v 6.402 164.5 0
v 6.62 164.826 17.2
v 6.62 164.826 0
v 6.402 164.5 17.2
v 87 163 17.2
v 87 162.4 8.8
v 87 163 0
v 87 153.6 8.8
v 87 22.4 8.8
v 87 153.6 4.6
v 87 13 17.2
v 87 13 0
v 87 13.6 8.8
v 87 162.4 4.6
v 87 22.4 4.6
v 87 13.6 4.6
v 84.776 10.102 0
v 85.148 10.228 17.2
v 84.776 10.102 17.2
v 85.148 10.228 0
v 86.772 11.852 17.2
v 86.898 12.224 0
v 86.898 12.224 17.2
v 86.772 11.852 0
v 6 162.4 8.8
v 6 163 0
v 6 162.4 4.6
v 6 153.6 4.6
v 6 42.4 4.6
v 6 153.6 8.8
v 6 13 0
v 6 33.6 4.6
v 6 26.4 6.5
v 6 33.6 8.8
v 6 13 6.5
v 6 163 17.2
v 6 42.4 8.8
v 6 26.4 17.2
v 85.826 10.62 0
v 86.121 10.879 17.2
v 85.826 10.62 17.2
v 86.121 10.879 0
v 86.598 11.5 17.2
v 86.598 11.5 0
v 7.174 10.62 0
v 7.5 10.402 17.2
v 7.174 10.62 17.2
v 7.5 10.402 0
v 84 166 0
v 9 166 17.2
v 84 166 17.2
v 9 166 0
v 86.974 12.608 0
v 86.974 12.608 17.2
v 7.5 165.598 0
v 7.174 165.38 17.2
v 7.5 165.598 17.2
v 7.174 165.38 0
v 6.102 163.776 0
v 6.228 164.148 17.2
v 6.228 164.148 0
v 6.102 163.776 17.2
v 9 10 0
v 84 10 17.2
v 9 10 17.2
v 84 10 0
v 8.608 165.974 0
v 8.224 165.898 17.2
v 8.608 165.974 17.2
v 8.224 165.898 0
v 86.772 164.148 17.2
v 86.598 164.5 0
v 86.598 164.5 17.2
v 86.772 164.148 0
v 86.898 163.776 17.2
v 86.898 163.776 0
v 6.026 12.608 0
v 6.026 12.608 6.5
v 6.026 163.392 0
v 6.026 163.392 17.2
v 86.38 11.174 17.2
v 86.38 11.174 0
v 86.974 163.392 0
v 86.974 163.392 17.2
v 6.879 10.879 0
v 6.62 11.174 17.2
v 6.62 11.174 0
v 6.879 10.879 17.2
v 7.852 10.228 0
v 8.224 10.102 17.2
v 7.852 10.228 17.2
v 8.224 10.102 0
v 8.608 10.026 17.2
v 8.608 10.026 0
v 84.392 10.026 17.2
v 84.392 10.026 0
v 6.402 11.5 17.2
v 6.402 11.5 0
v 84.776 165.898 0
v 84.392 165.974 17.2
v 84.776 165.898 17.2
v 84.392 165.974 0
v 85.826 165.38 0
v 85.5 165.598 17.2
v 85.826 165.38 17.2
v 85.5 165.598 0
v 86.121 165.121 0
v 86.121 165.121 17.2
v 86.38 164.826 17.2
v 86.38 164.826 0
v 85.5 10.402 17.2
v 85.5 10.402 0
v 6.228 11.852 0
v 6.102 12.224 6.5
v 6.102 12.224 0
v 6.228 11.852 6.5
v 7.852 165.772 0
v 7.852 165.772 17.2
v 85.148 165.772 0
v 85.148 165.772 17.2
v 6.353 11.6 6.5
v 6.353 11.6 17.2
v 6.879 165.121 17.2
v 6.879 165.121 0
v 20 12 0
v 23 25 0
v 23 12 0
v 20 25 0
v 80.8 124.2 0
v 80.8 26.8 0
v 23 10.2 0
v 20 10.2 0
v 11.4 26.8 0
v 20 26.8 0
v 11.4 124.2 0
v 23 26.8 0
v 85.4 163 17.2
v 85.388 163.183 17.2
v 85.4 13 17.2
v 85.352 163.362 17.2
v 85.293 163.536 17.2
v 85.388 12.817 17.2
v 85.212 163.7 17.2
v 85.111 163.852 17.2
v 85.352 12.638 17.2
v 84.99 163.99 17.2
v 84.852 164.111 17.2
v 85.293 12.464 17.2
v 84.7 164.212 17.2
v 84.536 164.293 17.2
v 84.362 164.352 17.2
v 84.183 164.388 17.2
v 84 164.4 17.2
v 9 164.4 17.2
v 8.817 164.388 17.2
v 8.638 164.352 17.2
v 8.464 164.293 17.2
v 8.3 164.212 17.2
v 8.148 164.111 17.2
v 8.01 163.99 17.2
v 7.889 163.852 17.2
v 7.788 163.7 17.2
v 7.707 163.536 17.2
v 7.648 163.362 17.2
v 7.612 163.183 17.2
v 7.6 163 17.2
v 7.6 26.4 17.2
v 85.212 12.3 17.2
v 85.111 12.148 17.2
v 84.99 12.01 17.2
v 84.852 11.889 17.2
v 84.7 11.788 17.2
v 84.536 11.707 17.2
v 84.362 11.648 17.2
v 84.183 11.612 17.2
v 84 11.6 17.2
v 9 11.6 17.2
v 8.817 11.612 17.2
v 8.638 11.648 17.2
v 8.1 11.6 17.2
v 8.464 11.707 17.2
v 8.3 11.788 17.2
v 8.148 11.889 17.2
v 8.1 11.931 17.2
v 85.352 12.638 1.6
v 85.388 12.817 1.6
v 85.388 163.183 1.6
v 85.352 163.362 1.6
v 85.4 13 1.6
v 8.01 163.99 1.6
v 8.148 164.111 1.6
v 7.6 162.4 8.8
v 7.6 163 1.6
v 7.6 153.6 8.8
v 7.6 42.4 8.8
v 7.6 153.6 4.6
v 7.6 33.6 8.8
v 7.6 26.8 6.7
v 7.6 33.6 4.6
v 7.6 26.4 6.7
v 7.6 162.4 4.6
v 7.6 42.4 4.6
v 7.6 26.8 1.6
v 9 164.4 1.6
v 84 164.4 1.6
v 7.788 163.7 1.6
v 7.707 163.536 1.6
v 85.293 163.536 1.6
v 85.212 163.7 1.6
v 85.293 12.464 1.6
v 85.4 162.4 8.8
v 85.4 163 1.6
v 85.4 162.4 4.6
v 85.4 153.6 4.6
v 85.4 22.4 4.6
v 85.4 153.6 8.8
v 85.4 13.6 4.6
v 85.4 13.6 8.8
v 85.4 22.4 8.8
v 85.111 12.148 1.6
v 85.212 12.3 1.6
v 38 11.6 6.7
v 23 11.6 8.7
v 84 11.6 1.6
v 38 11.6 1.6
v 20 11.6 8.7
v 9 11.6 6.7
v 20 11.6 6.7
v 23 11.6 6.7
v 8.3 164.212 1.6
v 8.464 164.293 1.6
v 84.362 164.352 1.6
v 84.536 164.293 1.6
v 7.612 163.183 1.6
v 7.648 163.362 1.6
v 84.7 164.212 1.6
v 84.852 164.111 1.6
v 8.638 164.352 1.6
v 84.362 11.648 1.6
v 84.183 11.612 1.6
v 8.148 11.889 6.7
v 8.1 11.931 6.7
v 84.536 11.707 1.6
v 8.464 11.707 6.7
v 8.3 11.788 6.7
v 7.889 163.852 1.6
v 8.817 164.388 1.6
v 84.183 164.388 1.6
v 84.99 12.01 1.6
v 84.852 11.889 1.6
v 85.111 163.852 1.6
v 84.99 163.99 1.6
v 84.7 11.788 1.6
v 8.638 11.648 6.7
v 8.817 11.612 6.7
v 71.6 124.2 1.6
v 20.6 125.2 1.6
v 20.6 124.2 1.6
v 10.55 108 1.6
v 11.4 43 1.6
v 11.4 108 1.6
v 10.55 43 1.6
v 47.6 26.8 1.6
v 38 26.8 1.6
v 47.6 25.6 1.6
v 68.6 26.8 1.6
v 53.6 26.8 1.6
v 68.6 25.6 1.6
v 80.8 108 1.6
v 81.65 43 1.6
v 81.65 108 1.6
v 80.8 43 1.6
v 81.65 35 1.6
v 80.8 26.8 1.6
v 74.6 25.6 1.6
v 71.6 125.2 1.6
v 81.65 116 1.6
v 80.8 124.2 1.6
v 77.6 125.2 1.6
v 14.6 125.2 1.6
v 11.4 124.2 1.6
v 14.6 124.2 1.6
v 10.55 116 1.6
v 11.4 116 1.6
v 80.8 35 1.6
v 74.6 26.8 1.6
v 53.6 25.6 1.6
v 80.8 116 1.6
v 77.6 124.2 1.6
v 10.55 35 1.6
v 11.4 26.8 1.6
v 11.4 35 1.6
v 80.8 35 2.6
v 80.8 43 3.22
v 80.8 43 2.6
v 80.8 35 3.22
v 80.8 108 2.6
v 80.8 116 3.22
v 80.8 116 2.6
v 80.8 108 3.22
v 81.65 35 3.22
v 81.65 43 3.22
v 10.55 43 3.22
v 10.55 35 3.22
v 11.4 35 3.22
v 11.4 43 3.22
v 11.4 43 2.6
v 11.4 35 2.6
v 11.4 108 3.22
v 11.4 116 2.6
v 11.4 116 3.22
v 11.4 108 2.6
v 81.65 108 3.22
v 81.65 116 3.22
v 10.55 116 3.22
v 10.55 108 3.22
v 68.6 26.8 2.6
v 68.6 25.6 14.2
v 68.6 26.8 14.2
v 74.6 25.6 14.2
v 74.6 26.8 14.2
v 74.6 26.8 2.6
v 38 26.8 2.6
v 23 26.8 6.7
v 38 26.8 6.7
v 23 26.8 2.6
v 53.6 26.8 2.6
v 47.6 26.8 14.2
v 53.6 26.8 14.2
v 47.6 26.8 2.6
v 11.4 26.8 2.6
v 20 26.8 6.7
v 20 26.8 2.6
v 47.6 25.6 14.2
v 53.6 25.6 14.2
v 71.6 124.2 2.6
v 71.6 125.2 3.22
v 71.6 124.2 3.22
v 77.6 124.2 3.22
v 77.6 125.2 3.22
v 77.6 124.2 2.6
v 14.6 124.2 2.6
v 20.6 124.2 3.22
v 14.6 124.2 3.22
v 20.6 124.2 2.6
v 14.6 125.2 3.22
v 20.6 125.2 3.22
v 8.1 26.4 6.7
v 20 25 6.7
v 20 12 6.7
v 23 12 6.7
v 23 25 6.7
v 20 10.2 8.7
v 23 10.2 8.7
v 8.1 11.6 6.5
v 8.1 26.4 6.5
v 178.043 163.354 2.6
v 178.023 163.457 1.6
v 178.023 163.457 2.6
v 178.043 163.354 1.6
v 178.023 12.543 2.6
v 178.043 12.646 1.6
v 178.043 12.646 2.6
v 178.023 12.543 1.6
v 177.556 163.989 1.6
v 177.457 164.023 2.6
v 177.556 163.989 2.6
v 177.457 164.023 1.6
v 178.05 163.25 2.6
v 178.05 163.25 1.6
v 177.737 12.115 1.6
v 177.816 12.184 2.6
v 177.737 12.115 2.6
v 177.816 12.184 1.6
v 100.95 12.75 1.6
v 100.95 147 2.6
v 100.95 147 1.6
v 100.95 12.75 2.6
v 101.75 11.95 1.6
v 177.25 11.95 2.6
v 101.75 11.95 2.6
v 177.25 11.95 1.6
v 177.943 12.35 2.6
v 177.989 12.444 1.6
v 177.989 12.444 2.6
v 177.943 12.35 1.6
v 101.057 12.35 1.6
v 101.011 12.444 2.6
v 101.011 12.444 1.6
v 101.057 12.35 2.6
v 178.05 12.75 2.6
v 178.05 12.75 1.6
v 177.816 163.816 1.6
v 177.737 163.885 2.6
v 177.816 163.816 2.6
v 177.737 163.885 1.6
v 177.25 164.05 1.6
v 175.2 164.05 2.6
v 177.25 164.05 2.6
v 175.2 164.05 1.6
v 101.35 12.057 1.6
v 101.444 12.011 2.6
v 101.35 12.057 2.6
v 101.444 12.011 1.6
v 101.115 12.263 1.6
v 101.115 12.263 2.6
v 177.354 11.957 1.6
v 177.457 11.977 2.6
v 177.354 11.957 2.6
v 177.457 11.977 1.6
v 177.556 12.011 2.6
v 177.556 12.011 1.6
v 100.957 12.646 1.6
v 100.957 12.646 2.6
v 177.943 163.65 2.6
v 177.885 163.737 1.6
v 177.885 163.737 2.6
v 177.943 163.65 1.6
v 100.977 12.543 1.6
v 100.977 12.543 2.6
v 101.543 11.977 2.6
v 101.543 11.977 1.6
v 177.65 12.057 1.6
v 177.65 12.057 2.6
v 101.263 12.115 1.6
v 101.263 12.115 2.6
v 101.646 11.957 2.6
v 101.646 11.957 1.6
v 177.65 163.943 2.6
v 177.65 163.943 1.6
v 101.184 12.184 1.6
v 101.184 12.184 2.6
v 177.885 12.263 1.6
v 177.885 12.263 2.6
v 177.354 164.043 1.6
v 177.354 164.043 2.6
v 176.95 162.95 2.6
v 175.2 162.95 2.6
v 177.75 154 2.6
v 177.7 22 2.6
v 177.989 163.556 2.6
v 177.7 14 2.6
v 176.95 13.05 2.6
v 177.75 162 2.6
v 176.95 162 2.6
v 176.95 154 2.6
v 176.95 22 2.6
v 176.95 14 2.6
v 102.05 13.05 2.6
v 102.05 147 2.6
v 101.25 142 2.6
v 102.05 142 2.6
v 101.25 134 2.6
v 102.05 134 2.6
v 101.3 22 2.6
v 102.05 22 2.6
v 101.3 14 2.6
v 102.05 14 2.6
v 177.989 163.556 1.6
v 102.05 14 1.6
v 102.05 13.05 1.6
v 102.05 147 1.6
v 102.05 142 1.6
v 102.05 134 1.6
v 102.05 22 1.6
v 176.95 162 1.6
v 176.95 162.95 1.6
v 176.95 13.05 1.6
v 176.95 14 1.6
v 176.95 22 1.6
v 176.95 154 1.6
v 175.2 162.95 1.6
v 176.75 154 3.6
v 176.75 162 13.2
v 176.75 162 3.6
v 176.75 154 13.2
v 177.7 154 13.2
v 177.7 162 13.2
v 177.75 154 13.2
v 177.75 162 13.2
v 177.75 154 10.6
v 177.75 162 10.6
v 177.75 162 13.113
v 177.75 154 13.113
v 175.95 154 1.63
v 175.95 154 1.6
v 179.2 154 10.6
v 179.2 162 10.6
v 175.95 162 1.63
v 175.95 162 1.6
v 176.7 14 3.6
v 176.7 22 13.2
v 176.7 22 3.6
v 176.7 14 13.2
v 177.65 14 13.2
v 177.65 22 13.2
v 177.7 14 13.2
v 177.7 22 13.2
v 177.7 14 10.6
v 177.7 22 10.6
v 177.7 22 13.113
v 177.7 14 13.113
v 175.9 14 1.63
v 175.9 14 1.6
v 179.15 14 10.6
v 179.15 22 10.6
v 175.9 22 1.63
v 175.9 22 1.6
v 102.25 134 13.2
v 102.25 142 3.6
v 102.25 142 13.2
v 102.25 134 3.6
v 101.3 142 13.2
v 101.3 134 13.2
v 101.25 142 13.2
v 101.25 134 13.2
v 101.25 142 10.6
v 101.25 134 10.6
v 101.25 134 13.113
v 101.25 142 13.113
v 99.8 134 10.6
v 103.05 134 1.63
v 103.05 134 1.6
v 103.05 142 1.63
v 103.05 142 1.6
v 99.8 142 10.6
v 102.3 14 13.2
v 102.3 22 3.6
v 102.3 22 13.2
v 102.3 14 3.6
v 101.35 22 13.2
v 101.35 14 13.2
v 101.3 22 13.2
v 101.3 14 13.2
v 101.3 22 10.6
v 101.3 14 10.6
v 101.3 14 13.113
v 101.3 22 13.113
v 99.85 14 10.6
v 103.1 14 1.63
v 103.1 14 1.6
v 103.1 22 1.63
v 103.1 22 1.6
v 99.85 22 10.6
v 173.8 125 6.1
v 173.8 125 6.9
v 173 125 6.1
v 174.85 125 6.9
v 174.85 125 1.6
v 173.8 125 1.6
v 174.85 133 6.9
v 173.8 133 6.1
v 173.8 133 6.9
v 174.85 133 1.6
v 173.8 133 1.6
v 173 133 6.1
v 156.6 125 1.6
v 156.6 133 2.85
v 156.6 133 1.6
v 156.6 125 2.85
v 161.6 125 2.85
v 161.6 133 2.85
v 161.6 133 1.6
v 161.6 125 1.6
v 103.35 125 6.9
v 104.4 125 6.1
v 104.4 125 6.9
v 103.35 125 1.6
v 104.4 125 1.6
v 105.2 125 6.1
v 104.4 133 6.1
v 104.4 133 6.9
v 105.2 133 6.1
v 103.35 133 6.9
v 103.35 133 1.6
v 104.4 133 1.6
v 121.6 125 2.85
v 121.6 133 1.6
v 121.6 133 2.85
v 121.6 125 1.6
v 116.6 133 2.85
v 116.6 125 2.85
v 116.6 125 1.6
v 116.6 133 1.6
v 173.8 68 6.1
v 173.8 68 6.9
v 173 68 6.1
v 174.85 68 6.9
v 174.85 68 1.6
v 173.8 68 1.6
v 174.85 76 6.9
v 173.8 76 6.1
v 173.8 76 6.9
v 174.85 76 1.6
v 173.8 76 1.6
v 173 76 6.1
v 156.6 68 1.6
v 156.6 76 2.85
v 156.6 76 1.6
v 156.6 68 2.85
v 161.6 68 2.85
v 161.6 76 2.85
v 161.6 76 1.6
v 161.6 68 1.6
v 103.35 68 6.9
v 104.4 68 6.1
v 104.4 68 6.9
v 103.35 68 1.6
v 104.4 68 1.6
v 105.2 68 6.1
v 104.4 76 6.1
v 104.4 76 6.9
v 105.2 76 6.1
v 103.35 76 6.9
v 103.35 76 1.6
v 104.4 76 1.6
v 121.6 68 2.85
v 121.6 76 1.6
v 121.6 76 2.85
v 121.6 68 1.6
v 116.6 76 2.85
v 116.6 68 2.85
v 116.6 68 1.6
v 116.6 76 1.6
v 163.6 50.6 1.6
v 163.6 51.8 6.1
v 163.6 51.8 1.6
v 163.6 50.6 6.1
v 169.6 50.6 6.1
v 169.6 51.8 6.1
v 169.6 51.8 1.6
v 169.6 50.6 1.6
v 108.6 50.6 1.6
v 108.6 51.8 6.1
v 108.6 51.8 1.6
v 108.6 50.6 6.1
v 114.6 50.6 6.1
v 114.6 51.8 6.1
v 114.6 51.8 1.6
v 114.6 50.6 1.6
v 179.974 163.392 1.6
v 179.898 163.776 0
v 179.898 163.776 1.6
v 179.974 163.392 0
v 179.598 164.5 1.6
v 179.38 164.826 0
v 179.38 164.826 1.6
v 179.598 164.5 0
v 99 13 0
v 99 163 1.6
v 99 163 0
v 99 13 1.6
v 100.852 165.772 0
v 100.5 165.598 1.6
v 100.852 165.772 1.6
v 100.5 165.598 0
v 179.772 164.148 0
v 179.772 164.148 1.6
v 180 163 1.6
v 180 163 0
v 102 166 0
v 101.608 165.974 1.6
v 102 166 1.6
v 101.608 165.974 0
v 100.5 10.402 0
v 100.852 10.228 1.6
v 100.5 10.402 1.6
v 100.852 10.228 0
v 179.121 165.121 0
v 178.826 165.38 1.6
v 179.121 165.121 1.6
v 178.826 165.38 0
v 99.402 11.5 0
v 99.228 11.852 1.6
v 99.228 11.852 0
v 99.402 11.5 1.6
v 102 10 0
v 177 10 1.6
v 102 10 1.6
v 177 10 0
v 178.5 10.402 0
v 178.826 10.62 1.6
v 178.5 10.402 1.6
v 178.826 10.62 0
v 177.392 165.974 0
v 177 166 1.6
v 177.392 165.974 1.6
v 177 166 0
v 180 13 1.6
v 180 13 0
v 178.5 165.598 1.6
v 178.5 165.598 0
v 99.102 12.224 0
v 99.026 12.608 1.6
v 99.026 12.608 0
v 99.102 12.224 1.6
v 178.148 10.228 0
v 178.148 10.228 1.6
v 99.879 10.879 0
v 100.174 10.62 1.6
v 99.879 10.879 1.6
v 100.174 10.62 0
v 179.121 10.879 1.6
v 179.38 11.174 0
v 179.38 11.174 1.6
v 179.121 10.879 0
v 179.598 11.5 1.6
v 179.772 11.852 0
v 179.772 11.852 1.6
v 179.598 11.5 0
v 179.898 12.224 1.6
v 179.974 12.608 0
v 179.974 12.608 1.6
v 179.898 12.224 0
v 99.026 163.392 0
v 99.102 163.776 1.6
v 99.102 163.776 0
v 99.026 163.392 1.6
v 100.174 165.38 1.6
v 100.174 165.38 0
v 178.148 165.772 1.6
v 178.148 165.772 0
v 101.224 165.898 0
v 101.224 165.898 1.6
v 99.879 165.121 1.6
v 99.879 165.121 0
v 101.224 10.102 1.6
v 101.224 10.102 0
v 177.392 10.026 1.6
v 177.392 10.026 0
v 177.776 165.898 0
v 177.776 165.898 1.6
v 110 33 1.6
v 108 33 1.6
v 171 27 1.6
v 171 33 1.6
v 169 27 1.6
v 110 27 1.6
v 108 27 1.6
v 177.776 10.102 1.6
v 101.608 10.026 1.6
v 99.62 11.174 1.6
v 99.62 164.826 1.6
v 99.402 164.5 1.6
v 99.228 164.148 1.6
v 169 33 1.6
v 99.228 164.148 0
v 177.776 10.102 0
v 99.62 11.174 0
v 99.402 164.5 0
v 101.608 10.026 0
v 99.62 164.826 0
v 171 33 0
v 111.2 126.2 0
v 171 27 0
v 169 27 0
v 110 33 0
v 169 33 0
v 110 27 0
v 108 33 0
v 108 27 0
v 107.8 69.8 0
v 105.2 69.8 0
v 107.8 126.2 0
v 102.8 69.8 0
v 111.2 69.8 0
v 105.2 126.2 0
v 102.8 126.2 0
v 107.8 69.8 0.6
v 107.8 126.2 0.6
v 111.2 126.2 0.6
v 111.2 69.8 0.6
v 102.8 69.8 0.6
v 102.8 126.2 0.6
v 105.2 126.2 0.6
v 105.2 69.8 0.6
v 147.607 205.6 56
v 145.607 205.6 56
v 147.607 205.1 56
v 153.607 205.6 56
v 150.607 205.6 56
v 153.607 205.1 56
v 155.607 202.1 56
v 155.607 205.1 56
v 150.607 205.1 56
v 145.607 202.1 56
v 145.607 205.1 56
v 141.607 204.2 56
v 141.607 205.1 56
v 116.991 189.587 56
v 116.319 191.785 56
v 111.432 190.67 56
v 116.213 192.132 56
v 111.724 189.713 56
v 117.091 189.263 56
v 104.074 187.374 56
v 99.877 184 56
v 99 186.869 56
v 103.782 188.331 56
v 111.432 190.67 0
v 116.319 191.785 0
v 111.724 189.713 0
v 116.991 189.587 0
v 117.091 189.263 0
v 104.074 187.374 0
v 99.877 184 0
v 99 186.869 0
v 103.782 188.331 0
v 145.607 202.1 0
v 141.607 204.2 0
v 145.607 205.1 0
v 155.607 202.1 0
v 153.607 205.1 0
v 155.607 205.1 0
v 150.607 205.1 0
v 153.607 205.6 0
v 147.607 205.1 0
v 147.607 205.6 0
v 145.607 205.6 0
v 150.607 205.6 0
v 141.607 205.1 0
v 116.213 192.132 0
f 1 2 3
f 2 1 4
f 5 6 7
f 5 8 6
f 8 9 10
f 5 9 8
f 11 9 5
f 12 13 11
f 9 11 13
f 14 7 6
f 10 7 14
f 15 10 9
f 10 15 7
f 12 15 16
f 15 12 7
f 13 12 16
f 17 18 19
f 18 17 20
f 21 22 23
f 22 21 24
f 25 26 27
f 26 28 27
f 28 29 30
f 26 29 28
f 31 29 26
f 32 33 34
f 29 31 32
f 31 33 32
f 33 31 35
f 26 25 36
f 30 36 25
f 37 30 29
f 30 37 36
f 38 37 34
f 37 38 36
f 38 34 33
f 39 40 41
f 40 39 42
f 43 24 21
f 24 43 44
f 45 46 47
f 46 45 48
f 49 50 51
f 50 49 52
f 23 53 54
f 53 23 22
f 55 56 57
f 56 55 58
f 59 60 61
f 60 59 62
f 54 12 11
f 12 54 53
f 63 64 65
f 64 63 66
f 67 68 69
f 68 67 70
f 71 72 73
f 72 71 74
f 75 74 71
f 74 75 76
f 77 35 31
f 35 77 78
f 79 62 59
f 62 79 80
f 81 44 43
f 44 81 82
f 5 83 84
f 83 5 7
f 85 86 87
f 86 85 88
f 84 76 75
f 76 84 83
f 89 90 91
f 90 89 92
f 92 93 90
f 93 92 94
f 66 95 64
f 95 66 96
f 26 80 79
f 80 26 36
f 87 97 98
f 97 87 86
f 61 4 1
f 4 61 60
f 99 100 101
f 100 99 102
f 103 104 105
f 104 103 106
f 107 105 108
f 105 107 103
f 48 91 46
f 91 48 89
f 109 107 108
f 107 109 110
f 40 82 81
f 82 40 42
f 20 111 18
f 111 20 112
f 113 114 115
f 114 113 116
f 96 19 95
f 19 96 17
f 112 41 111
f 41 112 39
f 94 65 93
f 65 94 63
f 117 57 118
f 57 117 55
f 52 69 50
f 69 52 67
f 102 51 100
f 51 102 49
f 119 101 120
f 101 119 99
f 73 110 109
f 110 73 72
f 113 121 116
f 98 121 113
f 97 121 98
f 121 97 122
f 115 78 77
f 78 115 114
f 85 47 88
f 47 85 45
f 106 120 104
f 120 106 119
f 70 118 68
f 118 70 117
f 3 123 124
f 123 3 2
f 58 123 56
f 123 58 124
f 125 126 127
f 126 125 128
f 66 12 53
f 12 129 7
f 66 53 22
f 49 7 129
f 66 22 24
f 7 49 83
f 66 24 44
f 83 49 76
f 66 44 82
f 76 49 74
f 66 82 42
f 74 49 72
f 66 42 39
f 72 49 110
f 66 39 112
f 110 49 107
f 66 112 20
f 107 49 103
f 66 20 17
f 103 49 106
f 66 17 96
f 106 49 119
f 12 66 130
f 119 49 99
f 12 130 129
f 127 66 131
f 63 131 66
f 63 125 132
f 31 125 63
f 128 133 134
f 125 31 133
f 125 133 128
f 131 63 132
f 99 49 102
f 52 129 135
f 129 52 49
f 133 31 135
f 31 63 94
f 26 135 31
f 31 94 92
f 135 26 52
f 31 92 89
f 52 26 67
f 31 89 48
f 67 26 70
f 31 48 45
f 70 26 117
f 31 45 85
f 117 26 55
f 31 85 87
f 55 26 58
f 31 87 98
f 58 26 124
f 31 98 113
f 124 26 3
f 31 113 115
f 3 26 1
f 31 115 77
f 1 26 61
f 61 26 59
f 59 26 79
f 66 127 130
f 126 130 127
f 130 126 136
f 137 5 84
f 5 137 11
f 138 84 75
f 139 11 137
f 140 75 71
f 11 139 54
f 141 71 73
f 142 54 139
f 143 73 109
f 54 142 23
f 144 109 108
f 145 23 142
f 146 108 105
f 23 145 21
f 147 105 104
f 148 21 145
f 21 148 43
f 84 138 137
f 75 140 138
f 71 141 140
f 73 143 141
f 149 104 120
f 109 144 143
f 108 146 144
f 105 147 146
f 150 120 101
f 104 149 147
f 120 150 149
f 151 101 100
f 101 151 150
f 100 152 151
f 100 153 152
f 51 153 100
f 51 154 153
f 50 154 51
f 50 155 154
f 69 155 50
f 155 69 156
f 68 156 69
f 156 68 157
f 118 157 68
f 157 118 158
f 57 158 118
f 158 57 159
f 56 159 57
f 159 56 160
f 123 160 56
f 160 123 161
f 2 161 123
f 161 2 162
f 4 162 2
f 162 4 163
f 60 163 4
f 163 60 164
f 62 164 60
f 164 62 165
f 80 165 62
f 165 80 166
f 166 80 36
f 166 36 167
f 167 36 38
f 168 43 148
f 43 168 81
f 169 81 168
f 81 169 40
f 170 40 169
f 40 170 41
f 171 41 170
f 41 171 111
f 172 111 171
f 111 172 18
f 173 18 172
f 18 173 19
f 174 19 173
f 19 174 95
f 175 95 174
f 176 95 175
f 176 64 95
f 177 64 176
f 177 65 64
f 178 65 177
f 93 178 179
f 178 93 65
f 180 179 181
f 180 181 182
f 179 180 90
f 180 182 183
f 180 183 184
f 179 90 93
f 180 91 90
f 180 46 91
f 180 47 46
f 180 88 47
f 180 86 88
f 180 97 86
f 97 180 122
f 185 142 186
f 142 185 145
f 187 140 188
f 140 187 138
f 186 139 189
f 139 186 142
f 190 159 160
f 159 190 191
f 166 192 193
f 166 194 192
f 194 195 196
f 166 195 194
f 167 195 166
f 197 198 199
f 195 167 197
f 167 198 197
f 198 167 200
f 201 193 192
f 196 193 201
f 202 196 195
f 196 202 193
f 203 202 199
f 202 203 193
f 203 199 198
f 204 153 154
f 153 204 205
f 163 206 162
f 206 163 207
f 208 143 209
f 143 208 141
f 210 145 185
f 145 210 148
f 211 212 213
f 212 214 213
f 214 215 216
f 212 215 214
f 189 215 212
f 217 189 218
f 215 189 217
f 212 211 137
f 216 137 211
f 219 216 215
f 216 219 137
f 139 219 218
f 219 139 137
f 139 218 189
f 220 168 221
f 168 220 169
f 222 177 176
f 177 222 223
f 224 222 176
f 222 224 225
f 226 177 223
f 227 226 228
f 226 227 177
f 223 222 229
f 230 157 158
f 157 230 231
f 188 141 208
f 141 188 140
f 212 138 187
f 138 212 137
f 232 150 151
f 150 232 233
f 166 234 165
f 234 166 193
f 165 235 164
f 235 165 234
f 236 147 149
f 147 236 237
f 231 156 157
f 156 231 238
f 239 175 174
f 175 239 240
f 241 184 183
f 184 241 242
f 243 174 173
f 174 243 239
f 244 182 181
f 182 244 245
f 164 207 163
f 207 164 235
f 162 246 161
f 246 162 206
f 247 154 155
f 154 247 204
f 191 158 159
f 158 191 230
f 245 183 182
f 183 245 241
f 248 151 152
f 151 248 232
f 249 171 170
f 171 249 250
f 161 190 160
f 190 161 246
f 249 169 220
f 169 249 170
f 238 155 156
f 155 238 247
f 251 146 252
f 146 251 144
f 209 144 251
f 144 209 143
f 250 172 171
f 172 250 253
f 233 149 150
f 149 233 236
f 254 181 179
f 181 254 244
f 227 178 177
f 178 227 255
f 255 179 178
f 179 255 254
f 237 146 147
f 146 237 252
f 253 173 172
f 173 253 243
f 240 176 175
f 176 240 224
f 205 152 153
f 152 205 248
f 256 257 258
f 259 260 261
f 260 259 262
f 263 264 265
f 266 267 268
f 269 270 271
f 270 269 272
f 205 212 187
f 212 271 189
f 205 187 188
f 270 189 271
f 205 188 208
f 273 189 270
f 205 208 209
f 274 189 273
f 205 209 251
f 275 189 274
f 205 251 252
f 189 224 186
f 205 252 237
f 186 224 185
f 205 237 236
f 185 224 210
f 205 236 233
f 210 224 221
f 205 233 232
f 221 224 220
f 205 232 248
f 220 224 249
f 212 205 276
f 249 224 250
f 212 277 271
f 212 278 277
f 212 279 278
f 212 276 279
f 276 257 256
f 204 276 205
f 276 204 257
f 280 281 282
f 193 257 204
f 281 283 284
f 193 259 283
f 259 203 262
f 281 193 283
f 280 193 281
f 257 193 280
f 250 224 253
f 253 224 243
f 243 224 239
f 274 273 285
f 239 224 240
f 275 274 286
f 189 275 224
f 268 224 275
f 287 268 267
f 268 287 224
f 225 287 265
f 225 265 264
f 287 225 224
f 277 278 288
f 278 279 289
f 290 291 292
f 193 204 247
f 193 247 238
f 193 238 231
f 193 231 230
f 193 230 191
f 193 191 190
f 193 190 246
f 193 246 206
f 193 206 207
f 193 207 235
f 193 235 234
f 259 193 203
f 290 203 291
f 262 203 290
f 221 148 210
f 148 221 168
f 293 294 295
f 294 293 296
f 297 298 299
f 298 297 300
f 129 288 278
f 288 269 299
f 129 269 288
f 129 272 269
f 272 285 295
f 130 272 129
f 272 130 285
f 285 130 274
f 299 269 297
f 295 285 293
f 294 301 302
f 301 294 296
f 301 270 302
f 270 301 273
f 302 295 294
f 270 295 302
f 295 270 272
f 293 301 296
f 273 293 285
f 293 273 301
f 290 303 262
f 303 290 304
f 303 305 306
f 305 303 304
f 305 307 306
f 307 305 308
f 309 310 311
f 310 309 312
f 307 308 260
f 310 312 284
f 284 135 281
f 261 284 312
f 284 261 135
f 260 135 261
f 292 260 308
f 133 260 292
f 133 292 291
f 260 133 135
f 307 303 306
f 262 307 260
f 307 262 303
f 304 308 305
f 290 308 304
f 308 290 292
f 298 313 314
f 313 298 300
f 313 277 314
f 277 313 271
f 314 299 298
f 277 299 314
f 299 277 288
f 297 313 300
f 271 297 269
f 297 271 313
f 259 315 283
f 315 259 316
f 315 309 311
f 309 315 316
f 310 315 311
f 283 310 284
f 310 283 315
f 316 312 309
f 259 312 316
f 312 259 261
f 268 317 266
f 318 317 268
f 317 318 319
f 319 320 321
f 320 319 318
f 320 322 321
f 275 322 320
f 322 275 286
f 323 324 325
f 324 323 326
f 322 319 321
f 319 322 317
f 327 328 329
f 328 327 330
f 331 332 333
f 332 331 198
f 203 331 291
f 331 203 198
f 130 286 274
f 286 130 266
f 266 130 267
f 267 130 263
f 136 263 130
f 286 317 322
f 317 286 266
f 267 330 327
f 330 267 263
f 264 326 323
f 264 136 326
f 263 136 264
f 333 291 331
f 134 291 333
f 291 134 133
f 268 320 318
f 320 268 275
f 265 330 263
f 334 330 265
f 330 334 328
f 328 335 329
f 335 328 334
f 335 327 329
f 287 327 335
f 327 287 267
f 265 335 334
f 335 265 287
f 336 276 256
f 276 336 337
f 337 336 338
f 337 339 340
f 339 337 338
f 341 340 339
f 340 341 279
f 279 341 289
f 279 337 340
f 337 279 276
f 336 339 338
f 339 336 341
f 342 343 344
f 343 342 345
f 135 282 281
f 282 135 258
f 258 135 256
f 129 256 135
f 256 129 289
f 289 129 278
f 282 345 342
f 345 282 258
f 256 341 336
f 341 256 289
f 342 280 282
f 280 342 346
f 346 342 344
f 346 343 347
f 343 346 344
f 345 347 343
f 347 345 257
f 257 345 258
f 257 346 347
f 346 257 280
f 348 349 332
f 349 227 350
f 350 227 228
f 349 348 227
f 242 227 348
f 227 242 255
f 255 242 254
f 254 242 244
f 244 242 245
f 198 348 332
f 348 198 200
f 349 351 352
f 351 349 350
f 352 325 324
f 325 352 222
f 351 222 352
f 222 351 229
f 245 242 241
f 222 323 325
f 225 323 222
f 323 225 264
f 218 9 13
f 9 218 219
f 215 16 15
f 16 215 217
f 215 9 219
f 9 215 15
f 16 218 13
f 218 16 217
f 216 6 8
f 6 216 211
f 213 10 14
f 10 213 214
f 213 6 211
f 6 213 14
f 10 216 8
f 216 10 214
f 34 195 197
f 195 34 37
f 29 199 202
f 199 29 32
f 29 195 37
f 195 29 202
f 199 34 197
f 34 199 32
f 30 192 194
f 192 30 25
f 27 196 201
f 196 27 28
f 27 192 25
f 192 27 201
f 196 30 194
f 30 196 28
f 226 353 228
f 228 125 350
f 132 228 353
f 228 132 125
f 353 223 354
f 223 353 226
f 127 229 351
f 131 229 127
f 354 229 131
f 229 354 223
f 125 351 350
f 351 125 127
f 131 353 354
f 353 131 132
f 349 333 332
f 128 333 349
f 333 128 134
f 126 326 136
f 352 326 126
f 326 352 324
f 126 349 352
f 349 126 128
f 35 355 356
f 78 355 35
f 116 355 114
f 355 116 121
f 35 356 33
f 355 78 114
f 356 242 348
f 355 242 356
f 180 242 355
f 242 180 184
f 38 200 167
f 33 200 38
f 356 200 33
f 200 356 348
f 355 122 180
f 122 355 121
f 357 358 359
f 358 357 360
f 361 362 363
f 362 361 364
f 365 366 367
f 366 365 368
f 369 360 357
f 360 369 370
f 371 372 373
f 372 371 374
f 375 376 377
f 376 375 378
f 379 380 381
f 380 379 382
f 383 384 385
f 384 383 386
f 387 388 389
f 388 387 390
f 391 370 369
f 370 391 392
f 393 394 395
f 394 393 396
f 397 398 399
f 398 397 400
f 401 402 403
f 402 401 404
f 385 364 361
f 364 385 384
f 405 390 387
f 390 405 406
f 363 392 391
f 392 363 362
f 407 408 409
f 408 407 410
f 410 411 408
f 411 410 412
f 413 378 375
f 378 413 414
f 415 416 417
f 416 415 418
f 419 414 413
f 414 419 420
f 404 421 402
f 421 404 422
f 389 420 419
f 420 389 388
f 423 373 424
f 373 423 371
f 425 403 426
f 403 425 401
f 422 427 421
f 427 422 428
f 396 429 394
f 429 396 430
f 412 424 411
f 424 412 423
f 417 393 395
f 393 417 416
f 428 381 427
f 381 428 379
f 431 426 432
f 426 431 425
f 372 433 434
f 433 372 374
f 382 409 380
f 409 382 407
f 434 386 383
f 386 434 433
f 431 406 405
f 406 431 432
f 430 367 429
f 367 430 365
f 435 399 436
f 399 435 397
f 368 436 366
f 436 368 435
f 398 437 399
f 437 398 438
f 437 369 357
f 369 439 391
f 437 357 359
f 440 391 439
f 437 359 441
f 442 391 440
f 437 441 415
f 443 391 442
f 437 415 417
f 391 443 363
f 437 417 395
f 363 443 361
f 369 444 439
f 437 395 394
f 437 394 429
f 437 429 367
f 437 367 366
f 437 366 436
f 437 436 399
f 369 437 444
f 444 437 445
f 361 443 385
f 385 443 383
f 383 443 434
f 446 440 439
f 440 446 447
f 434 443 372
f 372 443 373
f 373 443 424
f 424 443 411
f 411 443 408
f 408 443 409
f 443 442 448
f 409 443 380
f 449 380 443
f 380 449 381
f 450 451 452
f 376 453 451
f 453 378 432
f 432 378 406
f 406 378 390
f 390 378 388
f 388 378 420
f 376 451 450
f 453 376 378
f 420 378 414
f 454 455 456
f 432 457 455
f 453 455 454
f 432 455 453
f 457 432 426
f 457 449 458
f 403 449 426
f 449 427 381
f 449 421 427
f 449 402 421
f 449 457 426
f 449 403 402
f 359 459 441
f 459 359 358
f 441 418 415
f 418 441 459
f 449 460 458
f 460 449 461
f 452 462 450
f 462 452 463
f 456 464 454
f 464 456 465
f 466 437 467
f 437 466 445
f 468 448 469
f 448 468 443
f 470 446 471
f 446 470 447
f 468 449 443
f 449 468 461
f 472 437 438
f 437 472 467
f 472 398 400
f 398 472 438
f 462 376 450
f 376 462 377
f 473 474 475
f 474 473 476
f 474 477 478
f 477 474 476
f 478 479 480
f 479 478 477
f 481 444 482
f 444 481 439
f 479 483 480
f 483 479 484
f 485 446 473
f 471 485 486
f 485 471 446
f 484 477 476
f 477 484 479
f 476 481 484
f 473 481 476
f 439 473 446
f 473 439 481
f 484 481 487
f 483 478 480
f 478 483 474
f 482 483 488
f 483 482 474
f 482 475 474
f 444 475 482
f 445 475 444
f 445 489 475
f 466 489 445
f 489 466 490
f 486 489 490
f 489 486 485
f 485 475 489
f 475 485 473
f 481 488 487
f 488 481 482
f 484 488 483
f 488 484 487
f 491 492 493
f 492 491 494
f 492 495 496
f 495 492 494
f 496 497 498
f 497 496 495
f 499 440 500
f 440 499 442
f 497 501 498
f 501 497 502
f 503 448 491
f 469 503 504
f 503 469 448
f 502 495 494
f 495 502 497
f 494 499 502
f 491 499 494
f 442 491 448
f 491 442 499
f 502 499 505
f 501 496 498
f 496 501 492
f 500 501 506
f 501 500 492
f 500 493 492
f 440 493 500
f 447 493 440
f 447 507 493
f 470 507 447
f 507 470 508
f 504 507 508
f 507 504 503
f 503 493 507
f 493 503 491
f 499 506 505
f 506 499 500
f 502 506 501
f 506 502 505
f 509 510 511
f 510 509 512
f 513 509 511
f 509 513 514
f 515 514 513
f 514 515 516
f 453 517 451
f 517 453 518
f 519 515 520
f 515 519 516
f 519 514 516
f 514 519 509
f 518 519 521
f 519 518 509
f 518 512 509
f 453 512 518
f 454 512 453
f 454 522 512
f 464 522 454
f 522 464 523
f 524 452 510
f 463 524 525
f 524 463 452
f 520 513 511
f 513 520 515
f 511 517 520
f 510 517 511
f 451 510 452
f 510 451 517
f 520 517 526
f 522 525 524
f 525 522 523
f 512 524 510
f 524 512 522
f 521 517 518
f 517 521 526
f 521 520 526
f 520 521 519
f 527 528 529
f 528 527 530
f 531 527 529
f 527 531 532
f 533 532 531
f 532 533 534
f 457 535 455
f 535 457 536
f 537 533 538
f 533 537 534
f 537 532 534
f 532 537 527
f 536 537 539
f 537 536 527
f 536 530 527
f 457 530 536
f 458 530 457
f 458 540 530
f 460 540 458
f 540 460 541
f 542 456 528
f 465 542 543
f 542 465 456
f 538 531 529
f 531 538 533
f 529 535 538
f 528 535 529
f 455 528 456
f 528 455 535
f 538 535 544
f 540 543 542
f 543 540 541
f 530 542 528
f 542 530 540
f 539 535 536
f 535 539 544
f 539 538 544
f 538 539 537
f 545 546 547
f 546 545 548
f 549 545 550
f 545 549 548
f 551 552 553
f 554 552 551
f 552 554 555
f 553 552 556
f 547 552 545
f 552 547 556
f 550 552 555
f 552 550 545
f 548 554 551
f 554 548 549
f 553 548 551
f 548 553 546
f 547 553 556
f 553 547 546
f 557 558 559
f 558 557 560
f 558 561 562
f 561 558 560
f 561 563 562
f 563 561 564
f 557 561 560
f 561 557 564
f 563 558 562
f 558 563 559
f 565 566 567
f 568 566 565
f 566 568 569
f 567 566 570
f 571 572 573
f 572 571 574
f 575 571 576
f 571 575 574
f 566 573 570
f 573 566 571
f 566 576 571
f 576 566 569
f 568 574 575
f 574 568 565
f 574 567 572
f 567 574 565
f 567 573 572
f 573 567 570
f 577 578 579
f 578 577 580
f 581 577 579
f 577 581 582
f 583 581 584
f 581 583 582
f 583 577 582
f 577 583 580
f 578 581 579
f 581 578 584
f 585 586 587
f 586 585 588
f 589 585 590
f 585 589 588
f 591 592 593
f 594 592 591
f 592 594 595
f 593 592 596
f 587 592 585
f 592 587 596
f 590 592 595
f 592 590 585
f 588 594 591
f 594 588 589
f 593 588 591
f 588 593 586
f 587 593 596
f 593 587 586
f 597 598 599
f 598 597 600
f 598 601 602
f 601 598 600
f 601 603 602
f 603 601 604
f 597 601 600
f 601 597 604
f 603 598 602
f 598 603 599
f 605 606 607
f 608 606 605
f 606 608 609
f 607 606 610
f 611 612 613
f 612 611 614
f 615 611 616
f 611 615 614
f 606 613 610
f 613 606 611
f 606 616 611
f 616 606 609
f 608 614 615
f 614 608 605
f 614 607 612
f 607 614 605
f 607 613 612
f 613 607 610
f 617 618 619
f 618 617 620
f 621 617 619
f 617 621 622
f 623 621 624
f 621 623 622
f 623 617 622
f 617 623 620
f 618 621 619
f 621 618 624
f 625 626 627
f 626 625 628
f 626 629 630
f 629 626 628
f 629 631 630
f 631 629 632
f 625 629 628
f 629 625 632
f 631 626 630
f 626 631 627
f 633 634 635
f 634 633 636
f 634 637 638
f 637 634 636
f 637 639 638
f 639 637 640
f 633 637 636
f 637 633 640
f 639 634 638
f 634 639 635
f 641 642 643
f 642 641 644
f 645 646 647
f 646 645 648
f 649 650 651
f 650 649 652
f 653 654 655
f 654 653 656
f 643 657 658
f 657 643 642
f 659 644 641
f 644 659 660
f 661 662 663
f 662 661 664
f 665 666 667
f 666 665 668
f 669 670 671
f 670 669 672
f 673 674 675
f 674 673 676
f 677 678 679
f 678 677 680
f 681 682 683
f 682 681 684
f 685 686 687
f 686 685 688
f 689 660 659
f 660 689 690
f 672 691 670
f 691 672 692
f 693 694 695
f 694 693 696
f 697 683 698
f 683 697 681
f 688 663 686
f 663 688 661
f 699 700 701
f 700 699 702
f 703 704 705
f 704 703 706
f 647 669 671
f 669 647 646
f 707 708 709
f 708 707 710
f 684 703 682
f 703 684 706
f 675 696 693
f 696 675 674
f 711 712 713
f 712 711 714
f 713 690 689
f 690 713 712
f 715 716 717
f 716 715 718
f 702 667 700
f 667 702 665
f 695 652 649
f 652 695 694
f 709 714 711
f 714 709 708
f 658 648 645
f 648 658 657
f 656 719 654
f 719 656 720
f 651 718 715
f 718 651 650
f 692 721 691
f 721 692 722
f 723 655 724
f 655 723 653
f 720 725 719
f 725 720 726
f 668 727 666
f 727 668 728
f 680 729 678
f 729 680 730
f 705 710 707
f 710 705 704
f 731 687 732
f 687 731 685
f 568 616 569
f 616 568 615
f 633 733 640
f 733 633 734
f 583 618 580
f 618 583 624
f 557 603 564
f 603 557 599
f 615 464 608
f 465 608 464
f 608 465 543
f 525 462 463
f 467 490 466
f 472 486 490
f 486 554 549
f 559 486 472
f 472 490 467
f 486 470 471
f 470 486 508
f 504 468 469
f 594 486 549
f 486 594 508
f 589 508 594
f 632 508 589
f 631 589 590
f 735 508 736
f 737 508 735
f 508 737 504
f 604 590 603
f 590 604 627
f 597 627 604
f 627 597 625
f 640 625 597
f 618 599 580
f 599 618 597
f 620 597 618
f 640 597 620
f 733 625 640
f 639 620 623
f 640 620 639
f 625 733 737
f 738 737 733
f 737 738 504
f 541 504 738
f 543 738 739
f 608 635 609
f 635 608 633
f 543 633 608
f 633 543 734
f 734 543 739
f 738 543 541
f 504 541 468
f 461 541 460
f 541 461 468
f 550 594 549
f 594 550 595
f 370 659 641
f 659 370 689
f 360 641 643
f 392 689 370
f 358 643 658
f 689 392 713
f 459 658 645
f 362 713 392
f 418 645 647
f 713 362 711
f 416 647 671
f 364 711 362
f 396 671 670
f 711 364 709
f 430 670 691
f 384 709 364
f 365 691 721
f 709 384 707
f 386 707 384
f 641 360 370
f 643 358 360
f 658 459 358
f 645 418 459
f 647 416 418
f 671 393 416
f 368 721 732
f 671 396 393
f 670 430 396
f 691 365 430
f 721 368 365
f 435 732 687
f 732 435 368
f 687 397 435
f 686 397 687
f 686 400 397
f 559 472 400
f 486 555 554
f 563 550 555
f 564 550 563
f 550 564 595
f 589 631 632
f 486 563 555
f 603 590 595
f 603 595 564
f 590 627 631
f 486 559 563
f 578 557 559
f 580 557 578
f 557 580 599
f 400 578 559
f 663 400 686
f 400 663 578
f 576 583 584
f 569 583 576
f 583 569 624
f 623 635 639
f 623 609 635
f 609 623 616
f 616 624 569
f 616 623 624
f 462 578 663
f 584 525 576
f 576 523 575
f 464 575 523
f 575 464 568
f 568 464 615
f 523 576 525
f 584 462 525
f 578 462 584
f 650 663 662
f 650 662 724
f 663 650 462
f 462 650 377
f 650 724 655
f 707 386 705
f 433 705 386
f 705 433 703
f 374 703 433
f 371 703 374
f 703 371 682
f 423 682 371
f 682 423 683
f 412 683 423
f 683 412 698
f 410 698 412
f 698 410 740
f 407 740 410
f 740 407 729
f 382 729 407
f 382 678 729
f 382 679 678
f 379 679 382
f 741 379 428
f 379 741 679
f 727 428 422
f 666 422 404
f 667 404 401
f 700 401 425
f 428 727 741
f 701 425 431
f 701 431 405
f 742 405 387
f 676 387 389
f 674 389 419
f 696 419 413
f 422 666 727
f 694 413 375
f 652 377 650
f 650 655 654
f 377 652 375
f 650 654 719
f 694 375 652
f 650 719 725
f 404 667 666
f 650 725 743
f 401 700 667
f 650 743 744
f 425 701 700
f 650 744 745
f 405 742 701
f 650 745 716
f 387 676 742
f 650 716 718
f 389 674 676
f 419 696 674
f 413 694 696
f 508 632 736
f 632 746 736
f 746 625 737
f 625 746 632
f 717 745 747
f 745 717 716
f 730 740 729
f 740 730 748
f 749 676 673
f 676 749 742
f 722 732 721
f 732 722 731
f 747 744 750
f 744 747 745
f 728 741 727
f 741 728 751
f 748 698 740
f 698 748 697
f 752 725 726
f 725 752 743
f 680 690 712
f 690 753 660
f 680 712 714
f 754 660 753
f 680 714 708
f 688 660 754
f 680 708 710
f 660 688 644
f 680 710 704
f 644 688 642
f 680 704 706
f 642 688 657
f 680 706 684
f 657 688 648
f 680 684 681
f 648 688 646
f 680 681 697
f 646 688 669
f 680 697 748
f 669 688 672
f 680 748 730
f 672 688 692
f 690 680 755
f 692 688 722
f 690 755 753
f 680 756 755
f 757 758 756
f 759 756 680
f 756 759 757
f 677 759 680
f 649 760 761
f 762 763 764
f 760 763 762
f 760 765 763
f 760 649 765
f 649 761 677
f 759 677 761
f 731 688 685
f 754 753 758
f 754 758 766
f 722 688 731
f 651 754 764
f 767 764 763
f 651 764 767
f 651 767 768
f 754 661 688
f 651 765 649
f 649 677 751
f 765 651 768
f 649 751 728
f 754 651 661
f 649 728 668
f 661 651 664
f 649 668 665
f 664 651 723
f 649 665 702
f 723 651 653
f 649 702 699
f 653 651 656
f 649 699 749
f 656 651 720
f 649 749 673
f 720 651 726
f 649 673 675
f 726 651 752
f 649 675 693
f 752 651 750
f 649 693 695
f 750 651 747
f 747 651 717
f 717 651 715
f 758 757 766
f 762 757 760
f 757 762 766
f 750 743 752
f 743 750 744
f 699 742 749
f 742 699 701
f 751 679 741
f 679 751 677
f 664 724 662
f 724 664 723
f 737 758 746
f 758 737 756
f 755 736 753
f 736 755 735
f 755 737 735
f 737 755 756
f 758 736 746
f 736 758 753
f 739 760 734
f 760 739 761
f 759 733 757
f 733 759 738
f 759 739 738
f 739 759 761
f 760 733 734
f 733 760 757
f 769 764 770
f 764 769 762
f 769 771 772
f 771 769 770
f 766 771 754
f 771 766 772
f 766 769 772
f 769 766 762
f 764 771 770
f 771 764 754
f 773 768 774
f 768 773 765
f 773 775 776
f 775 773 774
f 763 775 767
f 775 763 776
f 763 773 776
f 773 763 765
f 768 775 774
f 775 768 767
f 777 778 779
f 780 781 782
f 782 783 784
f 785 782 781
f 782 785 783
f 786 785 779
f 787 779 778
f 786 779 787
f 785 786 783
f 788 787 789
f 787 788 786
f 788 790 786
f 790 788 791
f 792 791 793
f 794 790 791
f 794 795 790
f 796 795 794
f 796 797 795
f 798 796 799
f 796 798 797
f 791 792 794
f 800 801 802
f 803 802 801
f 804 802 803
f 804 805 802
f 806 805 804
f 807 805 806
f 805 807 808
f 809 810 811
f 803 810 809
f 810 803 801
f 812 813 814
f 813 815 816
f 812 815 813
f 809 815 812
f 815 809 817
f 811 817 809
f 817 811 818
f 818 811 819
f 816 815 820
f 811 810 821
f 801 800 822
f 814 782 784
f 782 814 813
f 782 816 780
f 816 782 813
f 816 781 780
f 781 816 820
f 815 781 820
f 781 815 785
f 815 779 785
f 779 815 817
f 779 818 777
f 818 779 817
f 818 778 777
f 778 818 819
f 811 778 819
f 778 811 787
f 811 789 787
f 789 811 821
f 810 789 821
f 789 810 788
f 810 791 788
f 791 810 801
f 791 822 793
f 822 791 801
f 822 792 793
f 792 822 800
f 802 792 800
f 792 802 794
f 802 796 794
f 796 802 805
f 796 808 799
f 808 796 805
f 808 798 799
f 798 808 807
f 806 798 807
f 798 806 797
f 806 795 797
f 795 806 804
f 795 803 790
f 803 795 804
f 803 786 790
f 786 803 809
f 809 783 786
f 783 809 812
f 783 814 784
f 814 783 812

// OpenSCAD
// Revision 5: acrylic slide retention; no buttons; 3 parts. Millimeters.
part="layout";
$fn=48; eps=.03;
W=81; H=156; D=17.2; lid_t=1.6; wall=1.6;
DX=6.4; DY=17; DW=69; DH=97;
glass_z=1.9; device_t=14; acrylic_t=3;
acrylic_z=glass_z+device_t; acrylic_front=acrylic_z-acrylic_t;
seat_z=acrylic_z+.05; rail_shoulder=acrylic_front-.2;
// The acrylic slide grooves provide the forward stop; the window does NOT
// overlap or clamp glass. 0.2 mm reveal per side exposes the entire glass.
window_overlap=-.2; lateral_clearance=.2;
// Same latch projection reference as revision 4: +0.4 mm toward the outside.
// Stem reach from lid inner face: 12.3 - 0.7 = 11.6 mm.
hook_tip=D-11.6; hook_shoulder=hook_tip+2.6;
clips=[[0,8],[0,148],[1,28],[1,148]];
screen_setback=10; mount_angle=17;
mount_x=W+34; mount_z=44.8+(glass_z-2.2)-screen_setback;
bracket_span=mount_x+9*cos(mount_angle);
bracket_top_z=mount_z+9*sin(mount_angle)+3*cos(mount_angle);
usb_center_z=glass_z+20-screen_setback; usb_floor=usb_center_z-5.2;
module rr(w,h,r=1){hull()for(x=[r,w-r],y=[r,h-r])translate([x,y])circle(r=r);}
module slab(w,h,t,r=1){linear_extrude(t)rr(w,h,r);}
module bore(x,y,z,d,h){translate([x,y,z])cylinder(d=d,h=h);}
module mirrored(){translate([W,0,0])mirror([1,0,0])children();}
module front_locators(){
 // Short stops locate the glass perimeter, outside its 69 x 97 envelope.
 for(y=[DY+8,DY+81]){
  translate([DX-1.05,y,wall-eps])cube([.85,8,1.65]);
  translate([DX+DW+.2,y,wall-eps])cube([.85,8,1.65]);
 }
 // Lower stops close the acrylic drawer only when the two halves are assembled.
 // Both are clear of the USB-A body at the opposite end of the footer.
 for(x=[DX+6,DX+27])translate([x,DY-1.4,wall-eps])cube([6,1.2,14.2-wall+eps]);
 // Upper glass stops avoid the central USB-C connector.
 for(x=[DX+3,DX+DW-9])translate([x,DY+DH+.2,wall-eps])cube([6,1,1.65]);
}
module shell_u(){
 difference(){
  union(){
   difference(){slab(W,H,D,3);translate([wall,wall,wall])slab(W-2*wall,H-2*wall,D+1,1.4);}
   front_locators();
   translate([49,1,wall-eps])cube([W-wall-49,15.8,usb_floor-wall+eps]);
  }
  translate([DX+window_overlap,DY+window_overlap,-1])cube([DW-2*window_overlap,DH-2*window_overlap,wall+2]);
  for(c=clips)translate([c[0]==0?-1:W-wall-.1,c[1]-4.4,D-12.6])cube([wall+2,8.8,4.2]);
  translate([W-wall-.5,1.6,usb_floor-.2])cube([wall+2.5,14.8,D+2]);
  for(y=[.2,15])translate([64,y,-1])cube([3,1.8,usb_floor+3]);
 }
}
module left_clip_u(y){
 translate([y>100?.05:0,y,0])union(){
  translate([2.25,-4,hook_tip])cube([1,8,D-hook_tip+eps]);
  hull(){translate([2.25,-4,D-2])cube([1,8,.2]);translate([2.25,-4,D-eps])cube([1.8,8,.2]);}
  translate([0,-4,0])rotate([-90,0,0])linear_extrude(8)
   polygon([[2.3,-hook_shoulder],[.8,-hook_shoulder],[2.3,-hook_tip]]);
 }
}
module acrylic_left_rail(y){
 // Rigid, open-ended slide groove. Device slides along Y, not through the lip.
 translate([0,y+8,0])rotate([90,0,0])linear_extrude(8)
  polygon([[DX-1.25,D+eps],[DX-.2,D+eps],[DX-.2,rail_shoulder],
           [DX+.6,rail_shoulder],[DX-.2,rail_shoulder-.8],[DX-1.25,rail_shoulder-.8]]);
 // Pad supports acrylic rear, independently of the screen glass.
 translate([DX+12,y,seat_z])cube([5,8,D-seat_z+eps]);
}
module acrylic_seats(){
 for(y=[DY+16,DY+73]){
  acrylic_left_rail(y);
  translate([2*DX+DW,0,0])mirror([1,0,0])acrylic_left_rail(y);
 }
 // Closed upper end; lower end is closed by front-shell stops after assembly.
 for(x=[DX+4,DX+DW-10])translate([x,DY+DH+.2,rail_shoulder])cube([6,1.2,D-rail_shoulder+eps]);
}
module cover_u(){
 difference(){
  union(){
   translate([0,0,D])slab(W,H,lid_t,3);
   difference(){
    translate([1.95,1.95,D-1])slab(W-3.9,H-3.9,1+eps,.8);
    translate([3.05,3.05,D-2])cube([W-6.1,H-6.1,4]);
    translate([4.8,-1,D-2])cube([W,20,5]);
   }
   for(c=clips)if(c[0]==0)left_clip_u(c[1]);else translate([W,0,0])mirror([1,0,0])left_clip_u(c[1]);
   acrylic_seats();
   // Rear support pads avoid the sliding paths of the four original screw heads.
  }
  translate([W-12.2,39.8,D+lid_t-.6])cube([3.4,56.4,1.2]);
  translate([W-6.2,39.8,D+lid_t-.6])cube([2.4,56.4,1.2]);
  // Only strap holes remain in the free cable chamber; no race-track or fences.
  for(x=[9,W-11])translate([x,133,D-1])cube([2,6,4]);
 }
}
module pad_profile(){translate([mount_x,mount_z])rotate(mount_angle)difference(){
 translate([-9,0])square([18,3]);translate([-4,-.1])square([8,1.1]);}}
module bracket_profile(){union(){
 translate([W-14,D+lid_t+.1])square([14,3]);
 translate([W-12,D+lid_t-.4])square([3,.53]);
 translate([W-6,D+lid_t-.4])square([2,.53]);
 hull(){translate([W-4,D+lid_t+1])square([4,2.1]);translate([mount_x,mount_z])rotate(mount_angle)translate([-7.8,1.2])square([4,1.6]);}
 pad_profile();}}
module bracket_u(){translate([0,96,0])rotate([90,0,0])linear_extrude(56)bracket_profile();}
module bracket(){translate([bracket_span,bracket_top_z,-40])rotate([90,0,0])mirror([1,0,0])bracket_u();}
module shell(){mirrored()shell_u();}
module cover(){translate([W,H,D+lid_t])rotate([180,0,0])mirror([1,0,0])cover_u();}
module cable_reference_u(){
 pts=concat([[3.8,132,8.9],[3.8,18,8.9]],
 [for(a=[180:6:270])[11.8+8*cos(a),18+8*sin(a),8.9]],[[30,10,10.5],[47,9,usb_center_z],[51,9,usb_center_z]]);
 for(i=[0:len(pts)-2])hull(){translate(pts[i])sphere(d=4);translate(pts[i+1])sphere(d=4);}
}
module top_connector_reference_u(){
 // Unmeasured envelope using the user's ~30 mm protrusion; no fixed cable mandrel.
 translate([DX+DW/2-4.5,DY+DH+eps,3.9])cube([9,30-eps,10]);
 pts=concat([for(a=[0:6:90])[DX+DW/2-8+8*cos(a),DY+DH+30+8*sin(a),8.9]],
 [[14,152,8.9],[8,140,8.9],[3.8,132,8.9]]);
 for(i=[0:len(pts)-2])hull(){translate(pts[i])sphere(d=4);translate(pts[i+1])sphere(d=4);}
}
module usb_reference_u(){
 translate([W-23,2,usb_center_z-5])cube([23,14,10]);
 translate([W-31,6,usb_center_z-2])cube([8.03,6,4]);
 translate([W,3,usb_center_z-2.25])cube([12,12,4.5]);
}
module device_envelope_u(){
 // Conservative front/PCB slab and inset electronics; edge space adjacent to
 // acrylic is evidenced by user's side photo, not a vendor mechanical drawing.
 translate([DX,DY,glass_z])cube([DW,DH,6]);
 translate([DX+1.2,DY+1.2,glass_z+6])cube([DW-2.4,DH-2.4,device_t-6]);
 acrylic_u();
 for(x=[DX+4,DX+DW-4],y=[DY+4,DY+DH-4]){
  bore(x,y,glass_z+1.4,6,device_t-1.4);
  // Reference head allowance; actual screw dimensions remain user supplied.
  bore(x,y,acrylic_z,6.8,1);
 }
}
module acrylic_u(){translate([DX,DY,acrylic_front])cube([DW,DH,acrylic_t]);}
module device_u(){
 color([.15,.20,.22])translate([DX,DY,glass_z])cube([DW,DH,1.4]);
 // Display face is an illustrative inset, not a claimed measurement of the active region.
 color([.8,.84,.75])translate([DX+2,DY+3,glass_z-.05])cube([DW-4,DH-6,.1]);
 color([.74,.64,.47])acrylic_u();
 for(x=[DX+4,DX+DW-4],y=[DY+4,DY+DH-4])color([.6,.6,.62])bore(x,y,glass_z+1.4,5,device_t-acrylic_t-1.4);
}
module assembly(ex=0,device=true){
 color([.23,.30,.34])shell();
 color([.23,.63,.57])translate([0,0,ex])mirrored()cover_u();
 color([.64,.47,.28])translate([0,0,ex*1.6])mirrored()bracket_u();
 if(device)mirrored()device_u();
}
module layout(){translate([6,10,0])shell();translate([99,10,0])cover();translate([99,184,0])bracket();}
if(part=="shell")shell();
else if(part=="cover")cover();
else if(part=="bracket")bracket();
else if(part=="layout")layout();
else if(part=="assembly")assembly();
else if(part=="exploded")assembly(32,true);
else if(part=="interference")intersection(){shell_u();cover_u();}
else if(part=="device_check")intersection(){union(){shell_u();cover_u();}device_envelope_u();}
else if(part=="glue_interference")intersection(){cover_u();bracket_u();}
else if(part=="routing_check")intersection(){union(){shell_u();cover_u();device_envelope_u();}union(){cable_reference_u();usb_reference_u();top_connector_reference_u();}}
else if(part=="slide_check")intersection(){cover_u();union(){
 translate([DX,DY-130,glass_z])cube([DW,DH+130,6]);
 translate([DX+1.2,DY+1.2-130,glass_z+6])cube([DW-2.4,DH-2.4+130,device_t-6]);
 translate([DX,DY-130,acrylic_front])cube([DW,DH+130,acrylic_t]);
 for(x=[DX+4,DX+DW-4]){
  translate([x-3,DY-130+1,glass_z+1.4])cube([6,DH+124,device_t-1.4]);
  translate([x-3.4,DY-130+.6,acrylic_z])cube([6.8,DH+128.8,1]);
 }
}}
else assert(false,"Unknown part");
